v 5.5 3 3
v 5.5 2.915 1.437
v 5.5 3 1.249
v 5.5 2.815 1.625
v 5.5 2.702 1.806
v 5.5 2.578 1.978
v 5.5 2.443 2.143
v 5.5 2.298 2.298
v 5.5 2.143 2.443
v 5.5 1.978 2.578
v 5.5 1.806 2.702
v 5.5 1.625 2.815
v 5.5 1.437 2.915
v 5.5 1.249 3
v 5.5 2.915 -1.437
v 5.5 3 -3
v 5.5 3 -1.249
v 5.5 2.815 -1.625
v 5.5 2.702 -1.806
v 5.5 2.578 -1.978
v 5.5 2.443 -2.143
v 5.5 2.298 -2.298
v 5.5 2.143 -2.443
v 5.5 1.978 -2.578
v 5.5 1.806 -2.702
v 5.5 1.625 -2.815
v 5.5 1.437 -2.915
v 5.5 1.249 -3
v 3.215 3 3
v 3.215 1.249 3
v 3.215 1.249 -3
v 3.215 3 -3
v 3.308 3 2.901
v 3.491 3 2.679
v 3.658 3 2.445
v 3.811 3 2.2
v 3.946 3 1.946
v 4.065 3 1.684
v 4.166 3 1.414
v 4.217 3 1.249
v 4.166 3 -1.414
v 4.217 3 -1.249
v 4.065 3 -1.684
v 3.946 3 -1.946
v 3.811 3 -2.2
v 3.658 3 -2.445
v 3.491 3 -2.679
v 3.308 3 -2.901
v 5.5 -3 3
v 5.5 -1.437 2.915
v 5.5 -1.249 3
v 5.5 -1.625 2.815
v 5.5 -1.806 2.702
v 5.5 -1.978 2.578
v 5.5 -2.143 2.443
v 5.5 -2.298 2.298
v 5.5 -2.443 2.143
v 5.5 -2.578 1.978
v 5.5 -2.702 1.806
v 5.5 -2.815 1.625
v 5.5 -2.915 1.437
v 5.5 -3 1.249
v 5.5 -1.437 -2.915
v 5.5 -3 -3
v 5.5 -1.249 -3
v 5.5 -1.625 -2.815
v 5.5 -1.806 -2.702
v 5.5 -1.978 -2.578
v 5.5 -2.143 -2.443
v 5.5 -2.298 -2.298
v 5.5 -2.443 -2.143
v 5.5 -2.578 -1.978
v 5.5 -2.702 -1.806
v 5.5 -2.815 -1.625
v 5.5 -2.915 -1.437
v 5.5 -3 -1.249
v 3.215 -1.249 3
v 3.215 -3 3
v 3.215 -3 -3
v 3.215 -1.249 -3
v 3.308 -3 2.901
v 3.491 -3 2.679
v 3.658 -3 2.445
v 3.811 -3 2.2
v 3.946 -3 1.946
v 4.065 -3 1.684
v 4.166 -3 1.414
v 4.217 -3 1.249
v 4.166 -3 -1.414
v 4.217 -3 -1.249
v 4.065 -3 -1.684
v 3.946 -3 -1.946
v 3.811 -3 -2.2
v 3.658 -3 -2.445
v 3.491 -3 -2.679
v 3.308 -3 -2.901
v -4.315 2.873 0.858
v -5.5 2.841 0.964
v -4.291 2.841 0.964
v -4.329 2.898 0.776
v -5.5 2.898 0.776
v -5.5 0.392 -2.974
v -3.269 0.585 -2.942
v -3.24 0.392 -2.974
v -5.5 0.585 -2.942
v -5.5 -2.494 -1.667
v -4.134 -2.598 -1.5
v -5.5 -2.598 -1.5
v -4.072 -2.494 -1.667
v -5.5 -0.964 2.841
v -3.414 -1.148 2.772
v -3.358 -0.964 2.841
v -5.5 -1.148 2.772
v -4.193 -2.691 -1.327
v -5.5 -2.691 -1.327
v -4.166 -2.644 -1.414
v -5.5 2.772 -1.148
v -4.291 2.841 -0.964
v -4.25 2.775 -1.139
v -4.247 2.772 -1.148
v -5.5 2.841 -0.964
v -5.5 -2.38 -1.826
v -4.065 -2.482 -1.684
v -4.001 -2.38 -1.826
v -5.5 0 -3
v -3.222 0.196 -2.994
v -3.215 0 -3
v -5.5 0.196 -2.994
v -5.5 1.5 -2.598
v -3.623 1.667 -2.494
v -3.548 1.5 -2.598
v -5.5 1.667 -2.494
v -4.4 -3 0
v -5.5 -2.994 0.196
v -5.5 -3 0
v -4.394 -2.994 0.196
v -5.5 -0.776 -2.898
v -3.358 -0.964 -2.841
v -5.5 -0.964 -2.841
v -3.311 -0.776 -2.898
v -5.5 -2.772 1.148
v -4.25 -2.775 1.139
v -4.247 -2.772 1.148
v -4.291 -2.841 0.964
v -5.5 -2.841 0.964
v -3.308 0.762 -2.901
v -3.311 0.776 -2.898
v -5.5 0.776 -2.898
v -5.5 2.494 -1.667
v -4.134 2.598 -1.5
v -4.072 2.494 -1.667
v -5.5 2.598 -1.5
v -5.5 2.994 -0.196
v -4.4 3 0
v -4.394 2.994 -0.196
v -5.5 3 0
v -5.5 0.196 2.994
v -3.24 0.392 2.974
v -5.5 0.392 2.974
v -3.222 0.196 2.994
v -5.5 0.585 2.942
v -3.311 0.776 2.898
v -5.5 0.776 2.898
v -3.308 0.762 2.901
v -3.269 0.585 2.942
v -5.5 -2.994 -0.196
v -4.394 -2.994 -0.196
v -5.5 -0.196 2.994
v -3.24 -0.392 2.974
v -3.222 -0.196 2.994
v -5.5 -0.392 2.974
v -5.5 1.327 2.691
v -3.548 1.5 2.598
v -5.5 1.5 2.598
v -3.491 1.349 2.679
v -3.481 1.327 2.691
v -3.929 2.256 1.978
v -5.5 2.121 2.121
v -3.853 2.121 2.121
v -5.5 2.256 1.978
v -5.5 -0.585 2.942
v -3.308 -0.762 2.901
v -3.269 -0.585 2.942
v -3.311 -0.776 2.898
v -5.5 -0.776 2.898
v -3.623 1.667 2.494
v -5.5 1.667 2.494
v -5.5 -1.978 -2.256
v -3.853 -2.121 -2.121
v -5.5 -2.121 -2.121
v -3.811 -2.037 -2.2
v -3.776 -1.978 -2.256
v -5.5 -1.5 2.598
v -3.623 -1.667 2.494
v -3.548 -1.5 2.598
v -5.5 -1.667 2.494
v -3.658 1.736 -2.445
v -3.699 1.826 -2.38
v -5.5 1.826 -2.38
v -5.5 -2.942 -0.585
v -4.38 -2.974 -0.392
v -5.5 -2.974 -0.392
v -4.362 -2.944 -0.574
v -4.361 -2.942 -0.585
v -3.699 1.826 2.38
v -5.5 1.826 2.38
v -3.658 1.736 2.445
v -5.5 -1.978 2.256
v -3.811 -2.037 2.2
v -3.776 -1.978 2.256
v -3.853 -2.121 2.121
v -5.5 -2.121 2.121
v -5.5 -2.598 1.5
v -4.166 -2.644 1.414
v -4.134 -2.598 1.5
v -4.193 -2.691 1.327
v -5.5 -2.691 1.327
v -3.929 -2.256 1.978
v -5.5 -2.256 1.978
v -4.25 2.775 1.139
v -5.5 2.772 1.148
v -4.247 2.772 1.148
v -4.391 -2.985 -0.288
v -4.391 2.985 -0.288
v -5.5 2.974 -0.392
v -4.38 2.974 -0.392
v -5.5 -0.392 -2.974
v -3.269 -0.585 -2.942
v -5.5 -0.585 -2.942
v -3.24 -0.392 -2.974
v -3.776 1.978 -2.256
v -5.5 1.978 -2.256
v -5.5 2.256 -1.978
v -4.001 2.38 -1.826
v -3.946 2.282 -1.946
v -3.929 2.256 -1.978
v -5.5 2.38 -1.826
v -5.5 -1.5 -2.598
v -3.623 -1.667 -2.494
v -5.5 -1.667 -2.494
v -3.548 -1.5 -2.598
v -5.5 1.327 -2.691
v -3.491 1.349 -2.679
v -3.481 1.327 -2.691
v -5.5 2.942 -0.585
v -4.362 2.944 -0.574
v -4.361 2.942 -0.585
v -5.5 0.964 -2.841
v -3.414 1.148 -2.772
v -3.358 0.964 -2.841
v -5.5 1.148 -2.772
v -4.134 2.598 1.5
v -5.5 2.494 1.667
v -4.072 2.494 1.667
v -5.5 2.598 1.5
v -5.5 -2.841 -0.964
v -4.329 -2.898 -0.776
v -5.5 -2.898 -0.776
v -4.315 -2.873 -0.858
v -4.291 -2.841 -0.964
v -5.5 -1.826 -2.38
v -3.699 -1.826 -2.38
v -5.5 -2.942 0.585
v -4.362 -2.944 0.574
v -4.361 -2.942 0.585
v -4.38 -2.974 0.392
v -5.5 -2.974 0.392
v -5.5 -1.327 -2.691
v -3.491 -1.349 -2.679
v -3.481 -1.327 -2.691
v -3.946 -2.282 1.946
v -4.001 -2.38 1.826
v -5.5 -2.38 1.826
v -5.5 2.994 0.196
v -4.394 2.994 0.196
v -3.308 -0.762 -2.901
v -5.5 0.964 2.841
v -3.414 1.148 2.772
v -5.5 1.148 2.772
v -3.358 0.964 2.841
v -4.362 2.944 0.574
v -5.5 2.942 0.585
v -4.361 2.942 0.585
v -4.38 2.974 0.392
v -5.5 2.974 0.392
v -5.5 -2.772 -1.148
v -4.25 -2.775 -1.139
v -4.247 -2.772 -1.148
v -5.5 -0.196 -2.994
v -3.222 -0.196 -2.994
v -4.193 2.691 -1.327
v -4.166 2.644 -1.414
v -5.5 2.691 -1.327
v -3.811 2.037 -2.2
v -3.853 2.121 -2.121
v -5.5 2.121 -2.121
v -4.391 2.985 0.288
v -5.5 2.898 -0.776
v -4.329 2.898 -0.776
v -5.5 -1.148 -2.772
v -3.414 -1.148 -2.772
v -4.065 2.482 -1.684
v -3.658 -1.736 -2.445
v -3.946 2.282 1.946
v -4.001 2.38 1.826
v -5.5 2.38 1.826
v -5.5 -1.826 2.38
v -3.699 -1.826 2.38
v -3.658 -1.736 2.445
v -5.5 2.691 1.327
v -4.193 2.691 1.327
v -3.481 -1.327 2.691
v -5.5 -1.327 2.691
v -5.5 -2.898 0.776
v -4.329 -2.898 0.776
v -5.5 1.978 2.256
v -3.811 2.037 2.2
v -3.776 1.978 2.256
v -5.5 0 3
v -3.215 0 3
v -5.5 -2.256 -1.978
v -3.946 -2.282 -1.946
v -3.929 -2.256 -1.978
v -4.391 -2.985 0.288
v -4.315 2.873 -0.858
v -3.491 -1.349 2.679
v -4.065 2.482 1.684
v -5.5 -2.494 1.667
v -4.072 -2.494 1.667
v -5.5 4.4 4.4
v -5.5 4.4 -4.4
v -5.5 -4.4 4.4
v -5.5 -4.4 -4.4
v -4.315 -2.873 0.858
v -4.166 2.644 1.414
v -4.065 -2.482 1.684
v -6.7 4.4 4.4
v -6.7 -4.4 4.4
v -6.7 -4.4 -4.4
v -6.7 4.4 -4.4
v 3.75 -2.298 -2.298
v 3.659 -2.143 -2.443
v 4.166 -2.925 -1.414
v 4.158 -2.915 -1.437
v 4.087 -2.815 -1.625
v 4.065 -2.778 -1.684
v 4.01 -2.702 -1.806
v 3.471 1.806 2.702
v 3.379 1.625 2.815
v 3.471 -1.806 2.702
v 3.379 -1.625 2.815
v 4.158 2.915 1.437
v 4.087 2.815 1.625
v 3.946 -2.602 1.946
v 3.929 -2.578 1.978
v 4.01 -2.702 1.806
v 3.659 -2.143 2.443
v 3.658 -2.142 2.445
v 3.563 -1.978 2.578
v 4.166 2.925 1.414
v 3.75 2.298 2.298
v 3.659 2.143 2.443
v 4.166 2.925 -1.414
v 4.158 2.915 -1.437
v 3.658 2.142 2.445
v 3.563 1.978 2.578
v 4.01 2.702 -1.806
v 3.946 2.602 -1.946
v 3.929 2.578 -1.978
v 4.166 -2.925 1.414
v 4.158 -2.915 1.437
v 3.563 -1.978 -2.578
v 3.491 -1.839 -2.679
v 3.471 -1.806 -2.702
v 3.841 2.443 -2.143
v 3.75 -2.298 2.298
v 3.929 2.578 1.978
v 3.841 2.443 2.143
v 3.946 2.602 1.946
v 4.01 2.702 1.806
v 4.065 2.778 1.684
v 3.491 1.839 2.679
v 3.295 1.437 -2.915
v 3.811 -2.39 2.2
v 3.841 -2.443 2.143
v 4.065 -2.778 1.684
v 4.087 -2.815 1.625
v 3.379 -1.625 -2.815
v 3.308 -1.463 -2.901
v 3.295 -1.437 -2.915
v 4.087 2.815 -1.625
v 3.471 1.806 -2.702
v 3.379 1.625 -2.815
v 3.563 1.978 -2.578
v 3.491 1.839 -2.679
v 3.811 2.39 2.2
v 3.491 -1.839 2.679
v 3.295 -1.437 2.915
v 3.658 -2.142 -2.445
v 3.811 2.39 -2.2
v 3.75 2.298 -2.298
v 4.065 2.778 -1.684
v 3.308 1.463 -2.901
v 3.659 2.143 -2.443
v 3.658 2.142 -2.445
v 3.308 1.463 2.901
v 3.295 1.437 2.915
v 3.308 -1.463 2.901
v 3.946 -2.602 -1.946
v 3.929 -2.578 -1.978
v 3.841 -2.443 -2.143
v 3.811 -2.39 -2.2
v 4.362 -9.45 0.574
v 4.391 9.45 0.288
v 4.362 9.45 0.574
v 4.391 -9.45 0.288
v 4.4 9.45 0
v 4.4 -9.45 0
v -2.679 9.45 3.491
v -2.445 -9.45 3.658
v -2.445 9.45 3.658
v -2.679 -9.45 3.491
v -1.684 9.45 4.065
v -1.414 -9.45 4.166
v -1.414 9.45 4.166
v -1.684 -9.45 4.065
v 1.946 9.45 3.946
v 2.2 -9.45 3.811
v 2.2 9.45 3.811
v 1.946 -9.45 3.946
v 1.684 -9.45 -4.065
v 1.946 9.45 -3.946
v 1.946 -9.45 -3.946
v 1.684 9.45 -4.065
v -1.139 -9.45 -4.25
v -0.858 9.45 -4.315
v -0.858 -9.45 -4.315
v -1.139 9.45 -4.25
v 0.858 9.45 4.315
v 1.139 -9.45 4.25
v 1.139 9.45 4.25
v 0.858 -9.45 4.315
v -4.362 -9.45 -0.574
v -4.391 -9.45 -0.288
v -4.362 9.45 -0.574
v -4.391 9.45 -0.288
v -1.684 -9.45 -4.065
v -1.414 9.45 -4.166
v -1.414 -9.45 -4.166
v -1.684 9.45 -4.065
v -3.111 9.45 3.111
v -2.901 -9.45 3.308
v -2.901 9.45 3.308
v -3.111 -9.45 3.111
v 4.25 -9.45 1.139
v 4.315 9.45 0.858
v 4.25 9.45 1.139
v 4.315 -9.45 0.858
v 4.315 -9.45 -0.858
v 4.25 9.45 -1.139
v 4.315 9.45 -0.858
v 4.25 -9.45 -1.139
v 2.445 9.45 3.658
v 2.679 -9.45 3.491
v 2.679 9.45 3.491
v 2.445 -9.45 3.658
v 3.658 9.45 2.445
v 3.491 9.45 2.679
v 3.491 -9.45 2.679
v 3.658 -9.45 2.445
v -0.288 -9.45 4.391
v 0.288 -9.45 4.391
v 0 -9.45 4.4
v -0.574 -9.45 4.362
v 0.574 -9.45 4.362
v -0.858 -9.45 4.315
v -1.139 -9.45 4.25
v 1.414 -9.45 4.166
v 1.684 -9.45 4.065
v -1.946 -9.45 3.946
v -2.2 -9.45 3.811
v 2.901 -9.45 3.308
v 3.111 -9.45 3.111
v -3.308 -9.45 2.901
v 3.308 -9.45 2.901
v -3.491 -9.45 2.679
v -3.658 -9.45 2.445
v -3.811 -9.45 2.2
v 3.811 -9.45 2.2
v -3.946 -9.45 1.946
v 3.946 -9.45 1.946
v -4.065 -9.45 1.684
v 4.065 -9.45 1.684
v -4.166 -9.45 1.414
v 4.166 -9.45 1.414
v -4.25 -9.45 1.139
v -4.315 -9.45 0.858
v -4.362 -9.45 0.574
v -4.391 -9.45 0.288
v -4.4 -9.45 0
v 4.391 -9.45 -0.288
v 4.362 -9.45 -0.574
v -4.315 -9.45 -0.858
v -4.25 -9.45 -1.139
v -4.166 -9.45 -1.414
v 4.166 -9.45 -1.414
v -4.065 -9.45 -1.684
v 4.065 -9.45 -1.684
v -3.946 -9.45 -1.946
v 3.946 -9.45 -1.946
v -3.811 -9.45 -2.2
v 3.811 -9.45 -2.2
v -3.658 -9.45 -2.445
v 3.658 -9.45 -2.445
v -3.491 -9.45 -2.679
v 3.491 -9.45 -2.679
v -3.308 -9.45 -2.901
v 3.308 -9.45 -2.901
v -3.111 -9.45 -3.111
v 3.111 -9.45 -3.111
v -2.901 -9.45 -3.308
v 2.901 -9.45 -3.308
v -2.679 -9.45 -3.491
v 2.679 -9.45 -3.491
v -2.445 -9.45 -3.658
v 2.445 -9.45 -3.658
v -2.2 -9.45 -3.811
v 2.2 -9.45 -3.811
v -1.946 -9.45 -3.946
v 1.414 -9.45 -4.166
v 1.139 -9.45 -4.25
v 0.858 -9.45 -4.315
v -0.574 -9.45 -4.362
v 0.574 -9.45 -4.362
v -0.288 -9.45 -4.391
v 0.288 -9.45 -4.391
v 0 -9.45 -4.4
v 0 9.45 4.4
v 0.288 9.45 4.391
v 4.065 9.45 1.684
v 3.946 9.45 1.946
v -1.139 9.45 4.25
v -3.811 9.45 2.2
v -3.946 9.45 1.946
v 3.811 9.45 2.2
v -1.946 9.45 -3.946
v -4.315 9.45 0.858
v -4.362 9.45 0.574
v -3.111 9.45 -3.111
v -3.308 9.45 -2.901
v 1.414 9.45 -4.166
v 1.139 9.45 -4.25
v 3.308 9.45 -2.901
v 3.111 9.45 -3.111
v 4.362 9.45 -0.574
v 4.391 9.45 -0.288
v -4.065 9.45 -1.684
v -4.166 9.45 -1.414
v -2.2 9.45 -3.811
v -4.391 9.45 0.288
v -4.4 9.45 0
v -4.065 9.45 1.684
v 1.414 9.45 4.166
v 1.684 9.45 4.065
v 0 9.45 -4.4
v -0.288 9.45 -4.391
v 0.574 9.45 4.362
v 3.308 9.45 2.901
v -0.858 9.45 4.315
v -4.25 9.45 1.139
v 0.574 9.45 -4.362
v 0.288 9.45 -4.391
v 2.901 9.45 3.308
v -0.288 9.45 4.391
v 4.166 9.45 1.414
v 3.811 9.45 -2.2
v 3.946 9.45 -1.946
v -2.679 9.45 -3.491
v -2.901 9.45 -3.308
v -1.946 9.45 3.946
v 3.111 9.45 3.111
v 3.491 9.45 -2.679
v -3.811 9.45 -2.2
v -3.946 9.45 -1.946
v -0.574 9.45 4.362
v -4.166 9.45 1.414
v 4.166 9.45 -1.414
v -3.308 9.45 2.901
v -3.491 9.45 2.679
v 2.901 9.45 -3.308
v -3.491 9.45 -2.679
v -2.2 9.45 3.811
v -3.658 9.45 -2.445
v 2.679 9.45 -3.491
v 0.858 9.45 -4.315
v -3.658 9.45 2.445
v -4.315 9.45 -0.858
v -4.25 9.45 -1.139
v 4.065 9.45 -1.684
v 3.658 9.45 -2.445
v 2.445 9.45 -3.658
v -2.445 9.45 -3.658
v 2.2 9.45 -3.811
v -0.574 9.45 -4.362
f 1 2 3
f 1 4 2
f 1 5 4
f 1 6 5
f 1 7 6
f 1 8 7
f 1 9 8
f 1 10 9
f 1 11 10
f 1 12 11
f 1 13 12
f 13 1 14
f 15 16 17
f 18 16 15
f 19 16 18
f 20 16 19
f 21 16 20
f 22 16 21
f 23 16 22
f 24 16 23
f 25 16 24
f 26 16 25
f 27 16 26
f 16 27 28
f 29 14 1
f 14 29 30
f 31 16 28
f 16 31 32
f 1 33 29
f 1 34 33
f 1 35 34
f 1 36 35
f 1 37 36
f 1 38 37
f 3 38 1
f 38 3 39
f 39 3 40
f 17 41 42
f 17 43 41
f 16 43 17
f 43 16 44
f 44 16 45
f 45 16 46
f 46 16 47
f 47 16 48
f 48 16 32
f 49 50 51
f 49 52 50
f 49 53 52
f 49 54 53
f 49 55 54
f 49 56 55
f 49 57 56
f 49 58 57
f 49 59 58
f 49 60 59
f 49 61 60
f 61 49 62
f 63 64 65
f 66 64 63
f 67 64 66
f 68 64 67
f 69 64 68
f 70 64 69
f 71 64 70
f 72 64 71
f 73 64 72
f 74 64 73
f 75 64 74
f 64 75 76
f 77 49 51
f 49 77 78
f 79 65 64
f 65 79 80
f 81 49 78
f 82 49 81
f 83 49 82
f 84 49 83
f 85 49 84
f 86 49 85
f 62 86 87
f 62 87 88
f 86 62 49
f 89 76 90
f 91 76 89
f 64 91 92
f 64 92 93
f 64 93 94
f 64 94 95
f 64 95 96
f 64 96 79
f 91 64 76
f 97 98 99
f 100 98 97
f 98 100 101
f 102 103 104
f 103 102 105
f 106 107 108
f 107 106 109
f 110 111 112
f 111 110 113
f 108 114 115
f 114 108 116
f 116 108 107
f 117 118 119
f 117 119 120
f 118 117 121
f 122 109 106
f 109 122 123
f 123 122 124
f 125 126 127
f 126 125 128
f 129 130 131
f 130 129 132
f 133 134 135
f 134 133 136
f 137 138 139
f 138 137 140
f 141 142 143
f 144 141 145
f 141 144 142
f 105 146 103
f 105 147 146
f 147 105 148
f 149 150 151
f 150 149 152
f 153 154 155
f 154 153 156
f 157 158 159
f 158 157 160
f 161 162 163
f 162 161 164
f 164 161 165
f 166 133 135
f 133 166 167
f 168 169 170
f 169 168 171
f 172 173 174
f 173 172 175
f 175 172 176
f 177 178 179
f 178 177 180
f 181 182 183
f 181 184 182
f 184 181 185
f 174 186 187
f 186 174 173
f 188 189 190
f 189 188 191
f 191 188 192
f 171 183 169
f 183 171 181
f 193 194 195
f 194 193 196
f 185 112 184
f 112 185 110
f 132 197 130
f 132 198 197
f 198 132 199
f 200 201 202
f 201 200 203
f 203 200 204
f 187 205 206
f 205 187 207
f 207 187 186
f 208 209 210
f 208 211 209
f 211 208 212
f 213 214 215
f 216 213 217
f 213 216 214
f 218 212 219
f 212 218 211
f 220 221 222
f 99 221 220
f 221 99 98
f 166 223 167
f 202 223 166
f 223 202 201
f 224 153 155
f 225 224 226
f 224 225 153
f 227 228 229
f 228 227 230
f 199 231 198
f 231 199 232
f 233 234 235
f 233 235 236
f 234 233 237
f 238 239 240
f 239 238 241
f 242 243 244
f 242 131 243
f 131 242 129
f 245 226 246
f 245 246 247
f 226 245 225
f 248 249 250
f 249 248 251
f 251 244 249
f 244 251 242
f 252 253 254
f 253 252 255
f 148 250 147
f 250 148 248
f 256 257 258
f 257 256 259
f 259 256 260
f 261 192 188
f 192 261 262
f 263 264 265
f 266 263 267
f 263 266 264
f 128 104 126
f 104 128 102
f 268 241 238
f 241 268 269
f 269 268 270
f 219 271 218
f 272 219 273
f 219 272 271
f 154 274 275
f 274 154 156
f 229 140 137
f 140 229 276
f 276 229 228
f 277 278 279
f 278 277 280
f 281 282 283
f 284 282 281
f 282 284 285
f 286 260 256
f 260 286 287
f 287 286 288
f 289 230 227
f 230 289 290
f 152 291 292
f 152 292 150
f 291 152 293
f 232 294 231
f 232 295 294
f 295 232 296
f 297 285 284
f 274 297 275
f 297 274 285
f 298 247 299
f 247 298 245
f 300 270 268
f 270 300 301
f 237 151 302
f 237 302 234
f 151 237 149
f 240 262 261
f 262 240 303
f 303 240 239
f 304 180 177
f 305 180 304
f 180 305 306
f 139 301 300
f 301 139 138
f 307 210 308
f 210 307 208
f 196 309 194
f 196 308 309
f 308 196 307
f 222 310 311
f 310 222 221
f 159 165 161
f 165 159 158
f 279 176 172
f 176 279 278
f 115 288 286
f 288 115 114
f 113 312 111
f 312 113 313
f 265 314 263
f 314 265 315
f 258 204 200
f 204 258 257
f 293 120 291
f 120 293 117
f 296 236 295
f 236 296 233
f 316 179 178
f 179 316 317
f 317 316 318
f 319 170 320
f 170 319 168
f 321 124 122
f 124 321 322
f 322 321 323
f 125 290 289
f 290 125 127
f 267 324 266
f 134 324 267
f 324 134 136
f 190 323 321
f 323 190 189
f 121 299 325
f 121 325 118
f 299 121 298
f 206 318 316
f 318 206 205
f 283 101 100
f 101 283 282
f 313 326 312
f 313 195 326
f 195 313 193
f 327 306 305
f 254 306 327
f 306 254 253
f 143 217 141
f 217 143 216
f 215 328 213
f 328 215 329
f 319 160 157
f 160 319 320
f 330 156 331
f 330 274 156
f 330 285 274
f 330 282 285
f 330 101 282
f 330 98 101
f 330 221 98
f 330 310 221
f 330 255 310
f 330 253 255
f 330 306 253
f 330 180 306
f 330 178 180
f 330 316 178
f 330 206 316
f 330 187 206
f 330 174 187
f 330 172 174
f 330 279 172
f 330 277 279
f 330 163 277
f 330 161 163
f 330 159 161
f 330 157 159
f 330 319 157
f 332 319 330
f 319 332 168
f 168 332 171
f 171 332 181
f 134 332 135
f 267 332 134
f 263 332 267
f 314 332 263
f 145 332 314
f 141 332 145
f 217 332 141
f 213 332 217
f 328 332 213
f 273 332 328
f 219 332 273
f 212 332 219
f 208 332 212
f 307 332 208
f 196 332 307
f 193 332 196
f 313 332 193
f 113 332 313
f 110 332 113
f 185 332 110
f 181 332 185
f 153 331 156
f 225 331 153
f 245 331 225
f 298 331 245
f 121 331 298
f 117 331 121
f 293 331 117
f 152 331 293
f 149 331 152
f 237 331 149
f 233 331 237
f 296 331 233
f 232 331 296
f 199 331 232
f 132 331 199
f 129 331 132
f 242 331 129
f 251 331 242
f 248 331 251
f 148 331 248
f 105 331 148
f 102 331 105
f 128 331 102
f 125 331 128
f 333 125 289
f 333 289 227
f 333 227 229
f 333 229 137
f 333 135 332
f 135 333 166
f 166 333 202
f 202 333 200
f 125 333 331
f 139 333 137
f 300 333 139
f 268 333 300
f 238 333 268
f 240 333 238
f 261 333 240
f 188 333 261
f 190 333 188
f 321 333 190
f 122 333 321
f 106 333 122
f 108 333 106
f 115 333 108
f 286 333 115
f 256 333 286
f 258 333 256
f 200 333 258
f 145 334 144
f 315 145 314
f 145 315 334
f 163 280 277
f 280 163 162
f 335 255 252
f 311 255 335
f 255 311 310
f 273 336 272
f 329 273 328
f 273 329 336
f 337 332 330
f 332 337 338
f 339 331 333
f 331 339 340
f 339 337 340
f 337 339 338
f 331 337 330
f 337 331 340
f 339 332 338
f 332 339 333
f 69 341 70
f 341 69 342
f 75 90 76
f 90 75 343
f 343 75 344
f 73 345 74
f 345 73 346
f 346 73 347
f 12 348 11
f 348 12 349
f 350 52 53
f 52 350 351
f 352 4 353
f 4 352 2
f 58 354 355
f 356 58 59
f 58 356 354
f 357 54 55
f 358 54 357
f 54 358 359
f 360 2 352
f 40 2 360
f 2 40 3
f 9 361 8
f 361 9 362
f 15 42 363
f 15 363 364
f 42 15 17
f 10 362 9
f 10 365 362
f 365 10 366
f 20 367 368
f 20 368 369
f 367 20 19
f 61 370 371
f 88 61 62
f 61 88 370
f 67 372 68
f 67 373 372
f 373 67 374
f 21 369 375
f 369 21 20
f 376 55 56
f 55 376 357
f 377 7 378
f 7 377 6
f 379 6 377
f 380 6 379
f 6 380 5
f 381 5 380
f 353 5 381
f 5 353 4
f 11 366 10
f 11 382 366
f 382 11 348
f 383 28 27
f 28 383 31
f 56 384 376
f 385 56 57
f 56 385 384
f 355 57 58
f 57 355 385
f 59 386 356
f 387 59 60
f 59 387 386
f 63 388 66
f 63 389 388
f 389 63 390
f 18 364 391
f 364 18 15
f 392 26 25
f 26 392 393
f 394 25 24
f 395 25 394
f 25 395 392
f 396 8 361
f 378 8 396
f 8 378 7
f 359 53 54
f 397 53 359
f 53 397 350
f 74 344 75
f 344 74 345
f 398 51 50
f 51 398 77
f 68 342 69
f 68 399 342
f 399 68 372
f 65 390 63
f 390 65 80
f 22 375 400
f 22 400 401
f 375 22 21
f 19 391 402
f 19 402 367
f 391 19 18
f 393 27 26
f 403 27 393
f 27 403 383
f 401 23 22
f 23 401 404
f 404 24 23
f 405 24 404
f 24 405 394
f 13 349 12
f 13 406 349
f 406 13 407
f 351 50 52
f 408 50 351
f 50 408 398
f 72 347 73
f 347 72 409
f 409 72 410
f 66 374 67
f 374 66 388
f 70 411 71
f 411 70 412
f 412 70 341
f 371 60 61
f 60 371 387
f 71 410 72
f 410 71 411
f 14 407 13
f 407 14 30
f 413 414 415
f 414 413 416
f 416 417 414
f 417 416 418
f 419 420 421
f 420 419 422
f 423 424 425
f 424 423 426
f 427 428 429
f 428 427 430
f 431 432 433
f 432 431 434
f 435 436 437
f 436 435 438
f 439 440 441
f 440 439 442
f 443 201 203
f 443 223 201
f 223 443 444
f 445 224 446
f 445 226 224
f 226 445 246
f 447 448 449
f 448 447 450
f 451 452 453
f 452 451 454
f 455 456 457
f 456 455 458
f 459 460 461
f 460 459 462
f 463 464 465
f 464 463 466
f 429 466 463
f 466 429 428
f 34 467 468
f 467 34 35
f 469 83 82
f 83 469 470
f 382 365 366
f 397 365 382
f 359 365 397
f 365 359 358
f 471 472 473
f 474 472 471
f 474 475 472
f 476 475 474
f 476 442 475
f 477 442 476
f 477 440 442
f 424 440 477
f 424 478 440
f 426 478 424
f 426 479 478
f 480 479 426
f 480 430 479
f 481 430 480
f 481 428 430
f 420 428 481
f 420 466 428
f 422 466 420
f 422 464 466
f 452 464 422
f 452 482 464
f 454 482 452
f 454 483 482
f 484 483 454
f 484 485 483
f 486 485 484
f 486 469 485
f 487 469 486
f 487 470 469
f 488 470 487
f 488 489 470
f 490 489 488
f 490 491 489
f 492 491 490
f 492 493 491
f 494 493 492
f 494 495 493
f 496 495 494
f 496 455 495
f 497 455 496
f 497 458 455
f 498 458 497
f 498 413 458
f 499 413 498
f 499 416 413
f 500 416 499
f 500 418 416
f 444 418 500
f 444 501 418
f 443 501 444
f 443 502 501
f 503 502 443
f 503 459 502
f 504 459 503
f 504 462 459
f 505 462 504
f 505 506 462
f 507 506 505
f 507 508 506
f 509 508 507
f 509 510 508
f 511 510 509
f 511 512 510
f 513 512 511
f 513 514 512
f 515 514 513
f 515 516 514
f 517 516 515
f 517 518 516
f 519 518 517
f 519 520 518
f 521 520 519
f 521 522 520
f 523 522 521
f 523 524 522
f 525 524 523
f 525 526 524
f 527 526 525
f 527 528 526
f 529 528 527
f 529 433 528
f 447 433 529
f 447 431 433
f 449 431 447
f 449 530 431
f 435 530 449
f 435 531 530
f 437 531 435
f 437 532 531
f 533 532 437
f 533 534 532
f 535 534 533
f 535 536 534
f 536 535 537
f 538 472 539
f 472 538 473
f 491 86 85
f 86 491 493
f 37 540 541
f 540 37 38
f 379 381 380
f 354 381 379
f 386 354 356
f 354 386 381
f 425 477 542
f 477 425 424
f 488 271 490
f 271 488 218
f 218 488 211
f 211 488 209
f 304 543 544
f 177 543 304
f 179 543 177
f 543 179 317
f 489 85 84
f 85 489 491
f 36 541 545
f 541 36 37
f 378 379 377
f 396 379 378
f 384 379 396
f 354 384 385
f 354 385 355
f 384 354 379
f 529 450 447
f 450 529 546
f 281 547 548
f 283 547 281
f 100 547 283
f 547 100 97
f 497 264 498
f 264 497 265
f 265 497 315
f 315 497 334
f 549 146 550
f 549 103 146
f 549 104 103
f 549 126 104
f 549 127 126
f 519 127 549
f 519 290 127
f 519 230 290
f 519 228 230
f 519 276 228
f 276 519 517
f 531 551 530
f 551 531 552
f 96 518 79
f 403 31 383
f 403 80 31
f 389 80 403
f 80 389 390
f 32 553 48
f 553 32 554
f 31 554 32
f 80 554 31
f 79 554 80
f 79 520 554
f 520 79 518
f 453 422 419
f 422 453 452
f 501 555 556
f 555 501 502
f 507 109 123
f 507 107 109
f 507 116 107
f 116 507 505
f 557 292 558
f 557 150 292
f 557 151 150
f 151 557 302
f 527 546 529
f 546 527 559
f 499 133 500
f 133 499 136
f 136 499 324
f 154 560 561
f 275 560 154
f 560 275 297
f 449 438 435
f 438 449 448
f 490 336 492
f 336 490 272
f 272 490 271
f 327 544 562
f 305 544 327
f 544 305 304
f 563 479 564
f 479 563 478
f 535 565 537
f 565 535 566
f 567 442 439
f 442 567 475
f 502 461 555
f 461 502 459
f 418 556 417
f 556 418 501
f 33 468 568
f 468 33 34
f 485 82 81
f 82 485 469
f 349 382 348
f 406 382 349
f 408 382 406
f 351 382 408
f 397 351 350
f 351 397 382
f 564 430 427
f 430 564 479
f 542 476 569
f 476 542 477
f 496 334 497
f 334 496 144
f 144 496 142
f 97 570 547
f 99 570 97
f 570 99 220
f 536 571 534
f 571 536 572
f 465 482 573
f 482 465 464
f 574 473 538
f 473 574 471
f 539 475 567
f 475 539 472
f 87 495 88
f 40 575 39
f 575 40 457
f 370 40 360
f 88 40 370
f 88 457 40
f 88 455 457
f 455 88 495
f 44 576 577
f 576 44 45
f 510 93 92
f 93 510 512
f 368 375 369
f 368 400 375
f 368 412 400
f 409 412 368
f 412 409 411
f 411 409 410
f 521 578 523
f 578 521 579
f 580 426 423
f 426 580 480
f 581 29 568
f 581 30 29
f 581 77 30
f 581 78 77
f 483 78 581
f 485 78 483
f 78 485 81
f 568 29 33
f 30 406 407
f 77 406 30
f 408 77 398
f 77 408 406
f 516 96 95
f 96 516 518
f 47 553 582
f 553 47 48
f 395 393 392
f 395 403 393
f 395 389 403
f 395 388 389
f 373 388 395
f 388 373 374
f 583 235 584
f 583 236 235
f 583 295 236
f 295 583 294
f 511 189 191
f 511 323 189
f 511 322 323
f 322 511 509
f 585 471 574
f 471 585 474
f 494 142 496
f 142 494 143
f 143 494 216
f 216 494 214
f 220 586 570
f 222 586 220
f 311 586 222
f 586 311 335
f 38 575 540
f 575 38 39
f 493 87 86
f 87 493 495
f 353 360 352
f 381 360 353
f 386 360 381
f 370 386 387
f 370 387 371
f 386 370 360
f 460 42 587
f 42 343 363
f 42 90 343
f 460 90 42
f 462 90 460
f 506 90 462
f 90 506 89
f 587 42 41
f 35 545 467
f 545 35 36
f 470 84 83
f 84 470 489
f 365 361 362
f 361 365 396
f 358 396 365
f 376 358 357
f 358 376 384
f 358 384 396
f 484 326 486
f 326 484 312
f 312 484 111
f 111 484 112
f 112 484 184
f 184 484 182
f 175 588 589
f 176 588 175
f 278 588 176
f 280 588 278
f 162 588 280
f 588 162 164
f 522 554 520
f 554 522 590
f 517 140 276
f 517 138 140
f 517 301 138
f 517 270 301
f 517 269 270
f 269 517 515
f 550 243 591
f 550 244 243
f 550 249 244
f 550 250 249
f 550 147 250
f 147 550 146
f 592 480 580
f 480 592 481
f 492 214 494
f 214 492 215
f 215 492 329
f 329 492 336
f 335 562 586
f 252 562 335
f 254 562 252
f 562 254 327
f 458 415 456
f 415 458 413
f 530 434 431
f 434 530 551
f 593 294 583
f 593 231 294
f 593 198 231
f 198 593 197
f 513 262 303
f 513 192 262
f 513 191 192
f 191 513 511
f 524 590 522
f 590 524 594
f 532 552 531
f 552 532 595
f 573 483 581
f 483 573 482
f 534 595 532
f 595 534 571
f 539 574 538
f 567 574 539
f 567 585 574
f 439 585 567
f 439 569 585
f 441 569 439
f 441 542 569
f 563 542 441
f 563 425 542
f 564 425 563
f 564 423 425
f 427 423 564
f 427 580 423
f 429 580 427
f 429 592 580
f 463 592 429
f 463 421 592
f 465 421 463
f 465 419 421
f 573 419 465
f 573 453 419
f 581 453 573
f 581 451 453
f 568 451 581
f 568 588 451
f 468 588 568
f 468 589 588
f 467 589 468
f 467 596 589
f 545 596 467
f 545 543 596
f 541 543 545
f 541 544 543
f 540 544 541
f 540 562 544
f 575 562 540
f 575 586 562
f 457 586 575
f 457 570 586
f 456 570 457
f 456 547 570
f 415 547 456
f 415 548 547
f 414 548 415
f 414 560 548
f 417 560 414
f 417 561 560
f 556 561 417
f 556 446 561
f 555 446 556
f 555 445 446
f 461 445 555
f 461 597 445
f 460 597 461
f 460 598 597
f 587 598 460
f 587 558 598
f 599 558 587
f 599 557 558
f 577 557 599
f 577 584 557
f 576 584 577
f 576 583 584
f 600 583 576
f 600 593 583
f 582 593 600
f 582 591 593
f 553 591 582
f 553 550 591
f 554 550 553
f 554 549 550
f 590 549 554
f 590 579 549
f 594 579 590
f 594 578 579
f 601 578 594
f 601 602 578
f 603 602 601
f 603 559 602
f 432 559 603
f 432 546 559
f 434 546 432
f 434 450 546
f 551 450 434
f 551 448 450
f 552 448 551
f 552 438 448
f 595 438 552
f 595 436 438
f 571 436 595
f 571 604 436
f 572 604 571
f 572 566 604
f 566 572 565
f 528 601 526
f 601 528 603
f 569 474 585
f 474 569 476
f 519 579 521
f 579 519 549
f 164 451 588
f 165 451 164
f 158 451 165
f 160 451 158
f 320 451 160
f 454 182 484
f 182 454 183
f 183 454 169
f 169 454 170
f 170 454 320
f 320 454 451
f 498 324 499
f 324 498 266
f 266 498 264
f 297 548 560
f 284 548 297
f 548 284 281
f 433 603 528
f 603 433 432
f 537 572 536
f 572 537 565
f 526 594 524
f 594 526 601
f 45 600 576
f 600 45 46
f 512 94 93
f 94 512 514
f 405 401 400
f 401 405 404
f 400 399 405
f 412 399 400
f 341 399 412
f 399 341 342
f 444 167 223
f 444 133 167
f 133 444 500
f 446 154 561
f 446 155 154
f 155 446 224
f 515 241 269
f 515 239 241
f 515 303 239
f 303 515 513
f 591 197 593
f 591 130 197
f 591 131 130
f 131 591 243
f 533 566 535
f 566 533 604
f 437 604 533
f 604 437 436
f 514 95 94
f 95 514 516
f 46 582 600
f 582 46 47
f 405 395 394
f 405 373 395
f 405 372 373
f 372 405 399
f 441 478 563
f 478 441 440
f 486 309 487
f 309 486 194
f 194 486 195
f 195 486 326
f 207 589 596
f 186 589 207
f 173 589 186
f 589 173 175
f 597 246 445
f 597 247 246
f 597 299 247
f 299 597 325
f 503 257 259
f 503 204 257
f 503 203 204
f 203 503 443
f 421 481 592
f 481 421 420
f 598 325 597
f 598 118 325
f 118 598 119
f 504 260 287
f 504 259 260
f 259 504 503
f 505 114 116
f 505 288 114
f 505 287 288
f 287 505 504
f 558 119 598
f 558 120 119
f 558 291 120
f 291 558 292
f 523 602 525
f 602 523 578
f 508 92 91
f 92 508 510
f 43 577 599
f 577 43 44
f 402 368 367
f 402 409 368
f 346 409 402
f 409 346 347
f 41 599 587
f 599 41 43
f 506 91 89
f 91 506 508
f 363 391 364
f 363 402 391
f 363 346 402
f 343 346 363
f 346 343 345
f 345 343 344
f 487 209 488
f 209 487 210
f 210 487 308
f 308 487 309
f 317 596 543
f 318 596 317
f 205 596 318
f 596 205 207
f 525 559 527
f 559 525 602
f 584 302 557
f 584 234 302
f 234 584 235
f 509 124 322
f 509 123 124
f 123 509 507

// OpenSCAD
$fn=96;

bbox = [11.0, 18.9, 8.8];

stem_d = 8.8;
stem_r = stem_d/2;
stem_len = 18.9;

barrel_d = 6.0;
barrel_r = barrel_d/2;
barrel_len = 11.0;

collar_d = 7.6;
collar_r = collar_d/2;
collar_thk = 2.2;

flange_thk = 1.2;
flange_w = 8.8;
flange_h = 8.8;

prong_len = 3.6;
slot_w = 2.2;
prong_gap = slot_w;
prong_thk = (barrel_d - prong_gap)/2;

chamfer = 0.9;

module stem() {
    rotate([90,0,0]) cylinder(h=stem_len, r=stem_r, center=true);
}

module collar() {
    rotate([0,90,0]) cylinder(h=collar_thk, r=collar_r, center=true);
}

module barrel_main() {
    rotate([0,90,0]) cylinder(h=barrel_len, r=barrel_r, center=true);
}

module flange_plate() {
    translate([-(barrel_len/2 + flange_thk/2), 0, 0])
        cube([flange_thk, flange_w, flange_h], center=true);
}

module prong_chamfer_wedge(len, thk, h, cham) {
    polyhedron(
        points=[
            [0, -thk/2, -h/2],
            [0,  thk/2, -h/2],
            [0,  thk/2,  h/2],
            [0, -thk/2,  h/2],
            [len, -thk/2, -h/2],
            [len,  thk/2, -h/2],
            [len,  thk/2,  h/2],
            [len, -thk/2,  h/2],
            [len, -thk/2, -h/2 + cham],
            [len,  thk/2, -h/2 + cham],
            [len,  thk/2,  h/2 - cham],
            [len, -thk/2,  h/2 - cham]
        ],
        faces=[
            [0,1,2,3],
            [4,5,6,7],
            [0,4,8,3],
            [1,2,10,9],
            [3,8,11,2],
            [0,1,5,4],
            [4,5,9,8],
            [7,6,10,11],
            [8,9,10,11]
        ],
        convexity=10
    );
}

module prong(len, thk, h, cham) {
    difference() {
        cube([len, thk, h], center=false);
        translate([len-cham, 0, 0])
            prong_chamfer_wedge(cham, thk, h, cham);
    }
}

module split_prongs() {
    x0 = barrel_len/2 - prong_len;
    y_off = (prong_gap/2 + prong_thk/2);
    translate([x0, 0, 0]) {
        translate([0,  y_off - prong_thk/2, -barrel_d/2])
            prong(prong_len, prong_thk, barrel_d, chamfer);
        translate([0, -y_off - prong_thk/2, -barrel_d/2])
            prong(prong_len, prong_thk, barrel_d, chamfer);
    }
}

module barrel_with_features() {
    difference() {
        union() {
            barrel_main();
            collar();
            flange_plate();
            split_prongs();
        }
        translate([barrel_len/2 - prong_len/2, 0, 0])
            cube([prong_len + 0.2, prong_gap, barrel_d + 0.4], center=true);
        translate([barrel_len/2 - prong_len/2, 0, 0])
            rotate([0,90,0]) cylinder(h=prong_len + 0.4, r=barrel_r + 0.25, center=true);
    }
}

module fitting() {
    union() {
        stem();
        barrel_with_features();
    }
}

fitting();
